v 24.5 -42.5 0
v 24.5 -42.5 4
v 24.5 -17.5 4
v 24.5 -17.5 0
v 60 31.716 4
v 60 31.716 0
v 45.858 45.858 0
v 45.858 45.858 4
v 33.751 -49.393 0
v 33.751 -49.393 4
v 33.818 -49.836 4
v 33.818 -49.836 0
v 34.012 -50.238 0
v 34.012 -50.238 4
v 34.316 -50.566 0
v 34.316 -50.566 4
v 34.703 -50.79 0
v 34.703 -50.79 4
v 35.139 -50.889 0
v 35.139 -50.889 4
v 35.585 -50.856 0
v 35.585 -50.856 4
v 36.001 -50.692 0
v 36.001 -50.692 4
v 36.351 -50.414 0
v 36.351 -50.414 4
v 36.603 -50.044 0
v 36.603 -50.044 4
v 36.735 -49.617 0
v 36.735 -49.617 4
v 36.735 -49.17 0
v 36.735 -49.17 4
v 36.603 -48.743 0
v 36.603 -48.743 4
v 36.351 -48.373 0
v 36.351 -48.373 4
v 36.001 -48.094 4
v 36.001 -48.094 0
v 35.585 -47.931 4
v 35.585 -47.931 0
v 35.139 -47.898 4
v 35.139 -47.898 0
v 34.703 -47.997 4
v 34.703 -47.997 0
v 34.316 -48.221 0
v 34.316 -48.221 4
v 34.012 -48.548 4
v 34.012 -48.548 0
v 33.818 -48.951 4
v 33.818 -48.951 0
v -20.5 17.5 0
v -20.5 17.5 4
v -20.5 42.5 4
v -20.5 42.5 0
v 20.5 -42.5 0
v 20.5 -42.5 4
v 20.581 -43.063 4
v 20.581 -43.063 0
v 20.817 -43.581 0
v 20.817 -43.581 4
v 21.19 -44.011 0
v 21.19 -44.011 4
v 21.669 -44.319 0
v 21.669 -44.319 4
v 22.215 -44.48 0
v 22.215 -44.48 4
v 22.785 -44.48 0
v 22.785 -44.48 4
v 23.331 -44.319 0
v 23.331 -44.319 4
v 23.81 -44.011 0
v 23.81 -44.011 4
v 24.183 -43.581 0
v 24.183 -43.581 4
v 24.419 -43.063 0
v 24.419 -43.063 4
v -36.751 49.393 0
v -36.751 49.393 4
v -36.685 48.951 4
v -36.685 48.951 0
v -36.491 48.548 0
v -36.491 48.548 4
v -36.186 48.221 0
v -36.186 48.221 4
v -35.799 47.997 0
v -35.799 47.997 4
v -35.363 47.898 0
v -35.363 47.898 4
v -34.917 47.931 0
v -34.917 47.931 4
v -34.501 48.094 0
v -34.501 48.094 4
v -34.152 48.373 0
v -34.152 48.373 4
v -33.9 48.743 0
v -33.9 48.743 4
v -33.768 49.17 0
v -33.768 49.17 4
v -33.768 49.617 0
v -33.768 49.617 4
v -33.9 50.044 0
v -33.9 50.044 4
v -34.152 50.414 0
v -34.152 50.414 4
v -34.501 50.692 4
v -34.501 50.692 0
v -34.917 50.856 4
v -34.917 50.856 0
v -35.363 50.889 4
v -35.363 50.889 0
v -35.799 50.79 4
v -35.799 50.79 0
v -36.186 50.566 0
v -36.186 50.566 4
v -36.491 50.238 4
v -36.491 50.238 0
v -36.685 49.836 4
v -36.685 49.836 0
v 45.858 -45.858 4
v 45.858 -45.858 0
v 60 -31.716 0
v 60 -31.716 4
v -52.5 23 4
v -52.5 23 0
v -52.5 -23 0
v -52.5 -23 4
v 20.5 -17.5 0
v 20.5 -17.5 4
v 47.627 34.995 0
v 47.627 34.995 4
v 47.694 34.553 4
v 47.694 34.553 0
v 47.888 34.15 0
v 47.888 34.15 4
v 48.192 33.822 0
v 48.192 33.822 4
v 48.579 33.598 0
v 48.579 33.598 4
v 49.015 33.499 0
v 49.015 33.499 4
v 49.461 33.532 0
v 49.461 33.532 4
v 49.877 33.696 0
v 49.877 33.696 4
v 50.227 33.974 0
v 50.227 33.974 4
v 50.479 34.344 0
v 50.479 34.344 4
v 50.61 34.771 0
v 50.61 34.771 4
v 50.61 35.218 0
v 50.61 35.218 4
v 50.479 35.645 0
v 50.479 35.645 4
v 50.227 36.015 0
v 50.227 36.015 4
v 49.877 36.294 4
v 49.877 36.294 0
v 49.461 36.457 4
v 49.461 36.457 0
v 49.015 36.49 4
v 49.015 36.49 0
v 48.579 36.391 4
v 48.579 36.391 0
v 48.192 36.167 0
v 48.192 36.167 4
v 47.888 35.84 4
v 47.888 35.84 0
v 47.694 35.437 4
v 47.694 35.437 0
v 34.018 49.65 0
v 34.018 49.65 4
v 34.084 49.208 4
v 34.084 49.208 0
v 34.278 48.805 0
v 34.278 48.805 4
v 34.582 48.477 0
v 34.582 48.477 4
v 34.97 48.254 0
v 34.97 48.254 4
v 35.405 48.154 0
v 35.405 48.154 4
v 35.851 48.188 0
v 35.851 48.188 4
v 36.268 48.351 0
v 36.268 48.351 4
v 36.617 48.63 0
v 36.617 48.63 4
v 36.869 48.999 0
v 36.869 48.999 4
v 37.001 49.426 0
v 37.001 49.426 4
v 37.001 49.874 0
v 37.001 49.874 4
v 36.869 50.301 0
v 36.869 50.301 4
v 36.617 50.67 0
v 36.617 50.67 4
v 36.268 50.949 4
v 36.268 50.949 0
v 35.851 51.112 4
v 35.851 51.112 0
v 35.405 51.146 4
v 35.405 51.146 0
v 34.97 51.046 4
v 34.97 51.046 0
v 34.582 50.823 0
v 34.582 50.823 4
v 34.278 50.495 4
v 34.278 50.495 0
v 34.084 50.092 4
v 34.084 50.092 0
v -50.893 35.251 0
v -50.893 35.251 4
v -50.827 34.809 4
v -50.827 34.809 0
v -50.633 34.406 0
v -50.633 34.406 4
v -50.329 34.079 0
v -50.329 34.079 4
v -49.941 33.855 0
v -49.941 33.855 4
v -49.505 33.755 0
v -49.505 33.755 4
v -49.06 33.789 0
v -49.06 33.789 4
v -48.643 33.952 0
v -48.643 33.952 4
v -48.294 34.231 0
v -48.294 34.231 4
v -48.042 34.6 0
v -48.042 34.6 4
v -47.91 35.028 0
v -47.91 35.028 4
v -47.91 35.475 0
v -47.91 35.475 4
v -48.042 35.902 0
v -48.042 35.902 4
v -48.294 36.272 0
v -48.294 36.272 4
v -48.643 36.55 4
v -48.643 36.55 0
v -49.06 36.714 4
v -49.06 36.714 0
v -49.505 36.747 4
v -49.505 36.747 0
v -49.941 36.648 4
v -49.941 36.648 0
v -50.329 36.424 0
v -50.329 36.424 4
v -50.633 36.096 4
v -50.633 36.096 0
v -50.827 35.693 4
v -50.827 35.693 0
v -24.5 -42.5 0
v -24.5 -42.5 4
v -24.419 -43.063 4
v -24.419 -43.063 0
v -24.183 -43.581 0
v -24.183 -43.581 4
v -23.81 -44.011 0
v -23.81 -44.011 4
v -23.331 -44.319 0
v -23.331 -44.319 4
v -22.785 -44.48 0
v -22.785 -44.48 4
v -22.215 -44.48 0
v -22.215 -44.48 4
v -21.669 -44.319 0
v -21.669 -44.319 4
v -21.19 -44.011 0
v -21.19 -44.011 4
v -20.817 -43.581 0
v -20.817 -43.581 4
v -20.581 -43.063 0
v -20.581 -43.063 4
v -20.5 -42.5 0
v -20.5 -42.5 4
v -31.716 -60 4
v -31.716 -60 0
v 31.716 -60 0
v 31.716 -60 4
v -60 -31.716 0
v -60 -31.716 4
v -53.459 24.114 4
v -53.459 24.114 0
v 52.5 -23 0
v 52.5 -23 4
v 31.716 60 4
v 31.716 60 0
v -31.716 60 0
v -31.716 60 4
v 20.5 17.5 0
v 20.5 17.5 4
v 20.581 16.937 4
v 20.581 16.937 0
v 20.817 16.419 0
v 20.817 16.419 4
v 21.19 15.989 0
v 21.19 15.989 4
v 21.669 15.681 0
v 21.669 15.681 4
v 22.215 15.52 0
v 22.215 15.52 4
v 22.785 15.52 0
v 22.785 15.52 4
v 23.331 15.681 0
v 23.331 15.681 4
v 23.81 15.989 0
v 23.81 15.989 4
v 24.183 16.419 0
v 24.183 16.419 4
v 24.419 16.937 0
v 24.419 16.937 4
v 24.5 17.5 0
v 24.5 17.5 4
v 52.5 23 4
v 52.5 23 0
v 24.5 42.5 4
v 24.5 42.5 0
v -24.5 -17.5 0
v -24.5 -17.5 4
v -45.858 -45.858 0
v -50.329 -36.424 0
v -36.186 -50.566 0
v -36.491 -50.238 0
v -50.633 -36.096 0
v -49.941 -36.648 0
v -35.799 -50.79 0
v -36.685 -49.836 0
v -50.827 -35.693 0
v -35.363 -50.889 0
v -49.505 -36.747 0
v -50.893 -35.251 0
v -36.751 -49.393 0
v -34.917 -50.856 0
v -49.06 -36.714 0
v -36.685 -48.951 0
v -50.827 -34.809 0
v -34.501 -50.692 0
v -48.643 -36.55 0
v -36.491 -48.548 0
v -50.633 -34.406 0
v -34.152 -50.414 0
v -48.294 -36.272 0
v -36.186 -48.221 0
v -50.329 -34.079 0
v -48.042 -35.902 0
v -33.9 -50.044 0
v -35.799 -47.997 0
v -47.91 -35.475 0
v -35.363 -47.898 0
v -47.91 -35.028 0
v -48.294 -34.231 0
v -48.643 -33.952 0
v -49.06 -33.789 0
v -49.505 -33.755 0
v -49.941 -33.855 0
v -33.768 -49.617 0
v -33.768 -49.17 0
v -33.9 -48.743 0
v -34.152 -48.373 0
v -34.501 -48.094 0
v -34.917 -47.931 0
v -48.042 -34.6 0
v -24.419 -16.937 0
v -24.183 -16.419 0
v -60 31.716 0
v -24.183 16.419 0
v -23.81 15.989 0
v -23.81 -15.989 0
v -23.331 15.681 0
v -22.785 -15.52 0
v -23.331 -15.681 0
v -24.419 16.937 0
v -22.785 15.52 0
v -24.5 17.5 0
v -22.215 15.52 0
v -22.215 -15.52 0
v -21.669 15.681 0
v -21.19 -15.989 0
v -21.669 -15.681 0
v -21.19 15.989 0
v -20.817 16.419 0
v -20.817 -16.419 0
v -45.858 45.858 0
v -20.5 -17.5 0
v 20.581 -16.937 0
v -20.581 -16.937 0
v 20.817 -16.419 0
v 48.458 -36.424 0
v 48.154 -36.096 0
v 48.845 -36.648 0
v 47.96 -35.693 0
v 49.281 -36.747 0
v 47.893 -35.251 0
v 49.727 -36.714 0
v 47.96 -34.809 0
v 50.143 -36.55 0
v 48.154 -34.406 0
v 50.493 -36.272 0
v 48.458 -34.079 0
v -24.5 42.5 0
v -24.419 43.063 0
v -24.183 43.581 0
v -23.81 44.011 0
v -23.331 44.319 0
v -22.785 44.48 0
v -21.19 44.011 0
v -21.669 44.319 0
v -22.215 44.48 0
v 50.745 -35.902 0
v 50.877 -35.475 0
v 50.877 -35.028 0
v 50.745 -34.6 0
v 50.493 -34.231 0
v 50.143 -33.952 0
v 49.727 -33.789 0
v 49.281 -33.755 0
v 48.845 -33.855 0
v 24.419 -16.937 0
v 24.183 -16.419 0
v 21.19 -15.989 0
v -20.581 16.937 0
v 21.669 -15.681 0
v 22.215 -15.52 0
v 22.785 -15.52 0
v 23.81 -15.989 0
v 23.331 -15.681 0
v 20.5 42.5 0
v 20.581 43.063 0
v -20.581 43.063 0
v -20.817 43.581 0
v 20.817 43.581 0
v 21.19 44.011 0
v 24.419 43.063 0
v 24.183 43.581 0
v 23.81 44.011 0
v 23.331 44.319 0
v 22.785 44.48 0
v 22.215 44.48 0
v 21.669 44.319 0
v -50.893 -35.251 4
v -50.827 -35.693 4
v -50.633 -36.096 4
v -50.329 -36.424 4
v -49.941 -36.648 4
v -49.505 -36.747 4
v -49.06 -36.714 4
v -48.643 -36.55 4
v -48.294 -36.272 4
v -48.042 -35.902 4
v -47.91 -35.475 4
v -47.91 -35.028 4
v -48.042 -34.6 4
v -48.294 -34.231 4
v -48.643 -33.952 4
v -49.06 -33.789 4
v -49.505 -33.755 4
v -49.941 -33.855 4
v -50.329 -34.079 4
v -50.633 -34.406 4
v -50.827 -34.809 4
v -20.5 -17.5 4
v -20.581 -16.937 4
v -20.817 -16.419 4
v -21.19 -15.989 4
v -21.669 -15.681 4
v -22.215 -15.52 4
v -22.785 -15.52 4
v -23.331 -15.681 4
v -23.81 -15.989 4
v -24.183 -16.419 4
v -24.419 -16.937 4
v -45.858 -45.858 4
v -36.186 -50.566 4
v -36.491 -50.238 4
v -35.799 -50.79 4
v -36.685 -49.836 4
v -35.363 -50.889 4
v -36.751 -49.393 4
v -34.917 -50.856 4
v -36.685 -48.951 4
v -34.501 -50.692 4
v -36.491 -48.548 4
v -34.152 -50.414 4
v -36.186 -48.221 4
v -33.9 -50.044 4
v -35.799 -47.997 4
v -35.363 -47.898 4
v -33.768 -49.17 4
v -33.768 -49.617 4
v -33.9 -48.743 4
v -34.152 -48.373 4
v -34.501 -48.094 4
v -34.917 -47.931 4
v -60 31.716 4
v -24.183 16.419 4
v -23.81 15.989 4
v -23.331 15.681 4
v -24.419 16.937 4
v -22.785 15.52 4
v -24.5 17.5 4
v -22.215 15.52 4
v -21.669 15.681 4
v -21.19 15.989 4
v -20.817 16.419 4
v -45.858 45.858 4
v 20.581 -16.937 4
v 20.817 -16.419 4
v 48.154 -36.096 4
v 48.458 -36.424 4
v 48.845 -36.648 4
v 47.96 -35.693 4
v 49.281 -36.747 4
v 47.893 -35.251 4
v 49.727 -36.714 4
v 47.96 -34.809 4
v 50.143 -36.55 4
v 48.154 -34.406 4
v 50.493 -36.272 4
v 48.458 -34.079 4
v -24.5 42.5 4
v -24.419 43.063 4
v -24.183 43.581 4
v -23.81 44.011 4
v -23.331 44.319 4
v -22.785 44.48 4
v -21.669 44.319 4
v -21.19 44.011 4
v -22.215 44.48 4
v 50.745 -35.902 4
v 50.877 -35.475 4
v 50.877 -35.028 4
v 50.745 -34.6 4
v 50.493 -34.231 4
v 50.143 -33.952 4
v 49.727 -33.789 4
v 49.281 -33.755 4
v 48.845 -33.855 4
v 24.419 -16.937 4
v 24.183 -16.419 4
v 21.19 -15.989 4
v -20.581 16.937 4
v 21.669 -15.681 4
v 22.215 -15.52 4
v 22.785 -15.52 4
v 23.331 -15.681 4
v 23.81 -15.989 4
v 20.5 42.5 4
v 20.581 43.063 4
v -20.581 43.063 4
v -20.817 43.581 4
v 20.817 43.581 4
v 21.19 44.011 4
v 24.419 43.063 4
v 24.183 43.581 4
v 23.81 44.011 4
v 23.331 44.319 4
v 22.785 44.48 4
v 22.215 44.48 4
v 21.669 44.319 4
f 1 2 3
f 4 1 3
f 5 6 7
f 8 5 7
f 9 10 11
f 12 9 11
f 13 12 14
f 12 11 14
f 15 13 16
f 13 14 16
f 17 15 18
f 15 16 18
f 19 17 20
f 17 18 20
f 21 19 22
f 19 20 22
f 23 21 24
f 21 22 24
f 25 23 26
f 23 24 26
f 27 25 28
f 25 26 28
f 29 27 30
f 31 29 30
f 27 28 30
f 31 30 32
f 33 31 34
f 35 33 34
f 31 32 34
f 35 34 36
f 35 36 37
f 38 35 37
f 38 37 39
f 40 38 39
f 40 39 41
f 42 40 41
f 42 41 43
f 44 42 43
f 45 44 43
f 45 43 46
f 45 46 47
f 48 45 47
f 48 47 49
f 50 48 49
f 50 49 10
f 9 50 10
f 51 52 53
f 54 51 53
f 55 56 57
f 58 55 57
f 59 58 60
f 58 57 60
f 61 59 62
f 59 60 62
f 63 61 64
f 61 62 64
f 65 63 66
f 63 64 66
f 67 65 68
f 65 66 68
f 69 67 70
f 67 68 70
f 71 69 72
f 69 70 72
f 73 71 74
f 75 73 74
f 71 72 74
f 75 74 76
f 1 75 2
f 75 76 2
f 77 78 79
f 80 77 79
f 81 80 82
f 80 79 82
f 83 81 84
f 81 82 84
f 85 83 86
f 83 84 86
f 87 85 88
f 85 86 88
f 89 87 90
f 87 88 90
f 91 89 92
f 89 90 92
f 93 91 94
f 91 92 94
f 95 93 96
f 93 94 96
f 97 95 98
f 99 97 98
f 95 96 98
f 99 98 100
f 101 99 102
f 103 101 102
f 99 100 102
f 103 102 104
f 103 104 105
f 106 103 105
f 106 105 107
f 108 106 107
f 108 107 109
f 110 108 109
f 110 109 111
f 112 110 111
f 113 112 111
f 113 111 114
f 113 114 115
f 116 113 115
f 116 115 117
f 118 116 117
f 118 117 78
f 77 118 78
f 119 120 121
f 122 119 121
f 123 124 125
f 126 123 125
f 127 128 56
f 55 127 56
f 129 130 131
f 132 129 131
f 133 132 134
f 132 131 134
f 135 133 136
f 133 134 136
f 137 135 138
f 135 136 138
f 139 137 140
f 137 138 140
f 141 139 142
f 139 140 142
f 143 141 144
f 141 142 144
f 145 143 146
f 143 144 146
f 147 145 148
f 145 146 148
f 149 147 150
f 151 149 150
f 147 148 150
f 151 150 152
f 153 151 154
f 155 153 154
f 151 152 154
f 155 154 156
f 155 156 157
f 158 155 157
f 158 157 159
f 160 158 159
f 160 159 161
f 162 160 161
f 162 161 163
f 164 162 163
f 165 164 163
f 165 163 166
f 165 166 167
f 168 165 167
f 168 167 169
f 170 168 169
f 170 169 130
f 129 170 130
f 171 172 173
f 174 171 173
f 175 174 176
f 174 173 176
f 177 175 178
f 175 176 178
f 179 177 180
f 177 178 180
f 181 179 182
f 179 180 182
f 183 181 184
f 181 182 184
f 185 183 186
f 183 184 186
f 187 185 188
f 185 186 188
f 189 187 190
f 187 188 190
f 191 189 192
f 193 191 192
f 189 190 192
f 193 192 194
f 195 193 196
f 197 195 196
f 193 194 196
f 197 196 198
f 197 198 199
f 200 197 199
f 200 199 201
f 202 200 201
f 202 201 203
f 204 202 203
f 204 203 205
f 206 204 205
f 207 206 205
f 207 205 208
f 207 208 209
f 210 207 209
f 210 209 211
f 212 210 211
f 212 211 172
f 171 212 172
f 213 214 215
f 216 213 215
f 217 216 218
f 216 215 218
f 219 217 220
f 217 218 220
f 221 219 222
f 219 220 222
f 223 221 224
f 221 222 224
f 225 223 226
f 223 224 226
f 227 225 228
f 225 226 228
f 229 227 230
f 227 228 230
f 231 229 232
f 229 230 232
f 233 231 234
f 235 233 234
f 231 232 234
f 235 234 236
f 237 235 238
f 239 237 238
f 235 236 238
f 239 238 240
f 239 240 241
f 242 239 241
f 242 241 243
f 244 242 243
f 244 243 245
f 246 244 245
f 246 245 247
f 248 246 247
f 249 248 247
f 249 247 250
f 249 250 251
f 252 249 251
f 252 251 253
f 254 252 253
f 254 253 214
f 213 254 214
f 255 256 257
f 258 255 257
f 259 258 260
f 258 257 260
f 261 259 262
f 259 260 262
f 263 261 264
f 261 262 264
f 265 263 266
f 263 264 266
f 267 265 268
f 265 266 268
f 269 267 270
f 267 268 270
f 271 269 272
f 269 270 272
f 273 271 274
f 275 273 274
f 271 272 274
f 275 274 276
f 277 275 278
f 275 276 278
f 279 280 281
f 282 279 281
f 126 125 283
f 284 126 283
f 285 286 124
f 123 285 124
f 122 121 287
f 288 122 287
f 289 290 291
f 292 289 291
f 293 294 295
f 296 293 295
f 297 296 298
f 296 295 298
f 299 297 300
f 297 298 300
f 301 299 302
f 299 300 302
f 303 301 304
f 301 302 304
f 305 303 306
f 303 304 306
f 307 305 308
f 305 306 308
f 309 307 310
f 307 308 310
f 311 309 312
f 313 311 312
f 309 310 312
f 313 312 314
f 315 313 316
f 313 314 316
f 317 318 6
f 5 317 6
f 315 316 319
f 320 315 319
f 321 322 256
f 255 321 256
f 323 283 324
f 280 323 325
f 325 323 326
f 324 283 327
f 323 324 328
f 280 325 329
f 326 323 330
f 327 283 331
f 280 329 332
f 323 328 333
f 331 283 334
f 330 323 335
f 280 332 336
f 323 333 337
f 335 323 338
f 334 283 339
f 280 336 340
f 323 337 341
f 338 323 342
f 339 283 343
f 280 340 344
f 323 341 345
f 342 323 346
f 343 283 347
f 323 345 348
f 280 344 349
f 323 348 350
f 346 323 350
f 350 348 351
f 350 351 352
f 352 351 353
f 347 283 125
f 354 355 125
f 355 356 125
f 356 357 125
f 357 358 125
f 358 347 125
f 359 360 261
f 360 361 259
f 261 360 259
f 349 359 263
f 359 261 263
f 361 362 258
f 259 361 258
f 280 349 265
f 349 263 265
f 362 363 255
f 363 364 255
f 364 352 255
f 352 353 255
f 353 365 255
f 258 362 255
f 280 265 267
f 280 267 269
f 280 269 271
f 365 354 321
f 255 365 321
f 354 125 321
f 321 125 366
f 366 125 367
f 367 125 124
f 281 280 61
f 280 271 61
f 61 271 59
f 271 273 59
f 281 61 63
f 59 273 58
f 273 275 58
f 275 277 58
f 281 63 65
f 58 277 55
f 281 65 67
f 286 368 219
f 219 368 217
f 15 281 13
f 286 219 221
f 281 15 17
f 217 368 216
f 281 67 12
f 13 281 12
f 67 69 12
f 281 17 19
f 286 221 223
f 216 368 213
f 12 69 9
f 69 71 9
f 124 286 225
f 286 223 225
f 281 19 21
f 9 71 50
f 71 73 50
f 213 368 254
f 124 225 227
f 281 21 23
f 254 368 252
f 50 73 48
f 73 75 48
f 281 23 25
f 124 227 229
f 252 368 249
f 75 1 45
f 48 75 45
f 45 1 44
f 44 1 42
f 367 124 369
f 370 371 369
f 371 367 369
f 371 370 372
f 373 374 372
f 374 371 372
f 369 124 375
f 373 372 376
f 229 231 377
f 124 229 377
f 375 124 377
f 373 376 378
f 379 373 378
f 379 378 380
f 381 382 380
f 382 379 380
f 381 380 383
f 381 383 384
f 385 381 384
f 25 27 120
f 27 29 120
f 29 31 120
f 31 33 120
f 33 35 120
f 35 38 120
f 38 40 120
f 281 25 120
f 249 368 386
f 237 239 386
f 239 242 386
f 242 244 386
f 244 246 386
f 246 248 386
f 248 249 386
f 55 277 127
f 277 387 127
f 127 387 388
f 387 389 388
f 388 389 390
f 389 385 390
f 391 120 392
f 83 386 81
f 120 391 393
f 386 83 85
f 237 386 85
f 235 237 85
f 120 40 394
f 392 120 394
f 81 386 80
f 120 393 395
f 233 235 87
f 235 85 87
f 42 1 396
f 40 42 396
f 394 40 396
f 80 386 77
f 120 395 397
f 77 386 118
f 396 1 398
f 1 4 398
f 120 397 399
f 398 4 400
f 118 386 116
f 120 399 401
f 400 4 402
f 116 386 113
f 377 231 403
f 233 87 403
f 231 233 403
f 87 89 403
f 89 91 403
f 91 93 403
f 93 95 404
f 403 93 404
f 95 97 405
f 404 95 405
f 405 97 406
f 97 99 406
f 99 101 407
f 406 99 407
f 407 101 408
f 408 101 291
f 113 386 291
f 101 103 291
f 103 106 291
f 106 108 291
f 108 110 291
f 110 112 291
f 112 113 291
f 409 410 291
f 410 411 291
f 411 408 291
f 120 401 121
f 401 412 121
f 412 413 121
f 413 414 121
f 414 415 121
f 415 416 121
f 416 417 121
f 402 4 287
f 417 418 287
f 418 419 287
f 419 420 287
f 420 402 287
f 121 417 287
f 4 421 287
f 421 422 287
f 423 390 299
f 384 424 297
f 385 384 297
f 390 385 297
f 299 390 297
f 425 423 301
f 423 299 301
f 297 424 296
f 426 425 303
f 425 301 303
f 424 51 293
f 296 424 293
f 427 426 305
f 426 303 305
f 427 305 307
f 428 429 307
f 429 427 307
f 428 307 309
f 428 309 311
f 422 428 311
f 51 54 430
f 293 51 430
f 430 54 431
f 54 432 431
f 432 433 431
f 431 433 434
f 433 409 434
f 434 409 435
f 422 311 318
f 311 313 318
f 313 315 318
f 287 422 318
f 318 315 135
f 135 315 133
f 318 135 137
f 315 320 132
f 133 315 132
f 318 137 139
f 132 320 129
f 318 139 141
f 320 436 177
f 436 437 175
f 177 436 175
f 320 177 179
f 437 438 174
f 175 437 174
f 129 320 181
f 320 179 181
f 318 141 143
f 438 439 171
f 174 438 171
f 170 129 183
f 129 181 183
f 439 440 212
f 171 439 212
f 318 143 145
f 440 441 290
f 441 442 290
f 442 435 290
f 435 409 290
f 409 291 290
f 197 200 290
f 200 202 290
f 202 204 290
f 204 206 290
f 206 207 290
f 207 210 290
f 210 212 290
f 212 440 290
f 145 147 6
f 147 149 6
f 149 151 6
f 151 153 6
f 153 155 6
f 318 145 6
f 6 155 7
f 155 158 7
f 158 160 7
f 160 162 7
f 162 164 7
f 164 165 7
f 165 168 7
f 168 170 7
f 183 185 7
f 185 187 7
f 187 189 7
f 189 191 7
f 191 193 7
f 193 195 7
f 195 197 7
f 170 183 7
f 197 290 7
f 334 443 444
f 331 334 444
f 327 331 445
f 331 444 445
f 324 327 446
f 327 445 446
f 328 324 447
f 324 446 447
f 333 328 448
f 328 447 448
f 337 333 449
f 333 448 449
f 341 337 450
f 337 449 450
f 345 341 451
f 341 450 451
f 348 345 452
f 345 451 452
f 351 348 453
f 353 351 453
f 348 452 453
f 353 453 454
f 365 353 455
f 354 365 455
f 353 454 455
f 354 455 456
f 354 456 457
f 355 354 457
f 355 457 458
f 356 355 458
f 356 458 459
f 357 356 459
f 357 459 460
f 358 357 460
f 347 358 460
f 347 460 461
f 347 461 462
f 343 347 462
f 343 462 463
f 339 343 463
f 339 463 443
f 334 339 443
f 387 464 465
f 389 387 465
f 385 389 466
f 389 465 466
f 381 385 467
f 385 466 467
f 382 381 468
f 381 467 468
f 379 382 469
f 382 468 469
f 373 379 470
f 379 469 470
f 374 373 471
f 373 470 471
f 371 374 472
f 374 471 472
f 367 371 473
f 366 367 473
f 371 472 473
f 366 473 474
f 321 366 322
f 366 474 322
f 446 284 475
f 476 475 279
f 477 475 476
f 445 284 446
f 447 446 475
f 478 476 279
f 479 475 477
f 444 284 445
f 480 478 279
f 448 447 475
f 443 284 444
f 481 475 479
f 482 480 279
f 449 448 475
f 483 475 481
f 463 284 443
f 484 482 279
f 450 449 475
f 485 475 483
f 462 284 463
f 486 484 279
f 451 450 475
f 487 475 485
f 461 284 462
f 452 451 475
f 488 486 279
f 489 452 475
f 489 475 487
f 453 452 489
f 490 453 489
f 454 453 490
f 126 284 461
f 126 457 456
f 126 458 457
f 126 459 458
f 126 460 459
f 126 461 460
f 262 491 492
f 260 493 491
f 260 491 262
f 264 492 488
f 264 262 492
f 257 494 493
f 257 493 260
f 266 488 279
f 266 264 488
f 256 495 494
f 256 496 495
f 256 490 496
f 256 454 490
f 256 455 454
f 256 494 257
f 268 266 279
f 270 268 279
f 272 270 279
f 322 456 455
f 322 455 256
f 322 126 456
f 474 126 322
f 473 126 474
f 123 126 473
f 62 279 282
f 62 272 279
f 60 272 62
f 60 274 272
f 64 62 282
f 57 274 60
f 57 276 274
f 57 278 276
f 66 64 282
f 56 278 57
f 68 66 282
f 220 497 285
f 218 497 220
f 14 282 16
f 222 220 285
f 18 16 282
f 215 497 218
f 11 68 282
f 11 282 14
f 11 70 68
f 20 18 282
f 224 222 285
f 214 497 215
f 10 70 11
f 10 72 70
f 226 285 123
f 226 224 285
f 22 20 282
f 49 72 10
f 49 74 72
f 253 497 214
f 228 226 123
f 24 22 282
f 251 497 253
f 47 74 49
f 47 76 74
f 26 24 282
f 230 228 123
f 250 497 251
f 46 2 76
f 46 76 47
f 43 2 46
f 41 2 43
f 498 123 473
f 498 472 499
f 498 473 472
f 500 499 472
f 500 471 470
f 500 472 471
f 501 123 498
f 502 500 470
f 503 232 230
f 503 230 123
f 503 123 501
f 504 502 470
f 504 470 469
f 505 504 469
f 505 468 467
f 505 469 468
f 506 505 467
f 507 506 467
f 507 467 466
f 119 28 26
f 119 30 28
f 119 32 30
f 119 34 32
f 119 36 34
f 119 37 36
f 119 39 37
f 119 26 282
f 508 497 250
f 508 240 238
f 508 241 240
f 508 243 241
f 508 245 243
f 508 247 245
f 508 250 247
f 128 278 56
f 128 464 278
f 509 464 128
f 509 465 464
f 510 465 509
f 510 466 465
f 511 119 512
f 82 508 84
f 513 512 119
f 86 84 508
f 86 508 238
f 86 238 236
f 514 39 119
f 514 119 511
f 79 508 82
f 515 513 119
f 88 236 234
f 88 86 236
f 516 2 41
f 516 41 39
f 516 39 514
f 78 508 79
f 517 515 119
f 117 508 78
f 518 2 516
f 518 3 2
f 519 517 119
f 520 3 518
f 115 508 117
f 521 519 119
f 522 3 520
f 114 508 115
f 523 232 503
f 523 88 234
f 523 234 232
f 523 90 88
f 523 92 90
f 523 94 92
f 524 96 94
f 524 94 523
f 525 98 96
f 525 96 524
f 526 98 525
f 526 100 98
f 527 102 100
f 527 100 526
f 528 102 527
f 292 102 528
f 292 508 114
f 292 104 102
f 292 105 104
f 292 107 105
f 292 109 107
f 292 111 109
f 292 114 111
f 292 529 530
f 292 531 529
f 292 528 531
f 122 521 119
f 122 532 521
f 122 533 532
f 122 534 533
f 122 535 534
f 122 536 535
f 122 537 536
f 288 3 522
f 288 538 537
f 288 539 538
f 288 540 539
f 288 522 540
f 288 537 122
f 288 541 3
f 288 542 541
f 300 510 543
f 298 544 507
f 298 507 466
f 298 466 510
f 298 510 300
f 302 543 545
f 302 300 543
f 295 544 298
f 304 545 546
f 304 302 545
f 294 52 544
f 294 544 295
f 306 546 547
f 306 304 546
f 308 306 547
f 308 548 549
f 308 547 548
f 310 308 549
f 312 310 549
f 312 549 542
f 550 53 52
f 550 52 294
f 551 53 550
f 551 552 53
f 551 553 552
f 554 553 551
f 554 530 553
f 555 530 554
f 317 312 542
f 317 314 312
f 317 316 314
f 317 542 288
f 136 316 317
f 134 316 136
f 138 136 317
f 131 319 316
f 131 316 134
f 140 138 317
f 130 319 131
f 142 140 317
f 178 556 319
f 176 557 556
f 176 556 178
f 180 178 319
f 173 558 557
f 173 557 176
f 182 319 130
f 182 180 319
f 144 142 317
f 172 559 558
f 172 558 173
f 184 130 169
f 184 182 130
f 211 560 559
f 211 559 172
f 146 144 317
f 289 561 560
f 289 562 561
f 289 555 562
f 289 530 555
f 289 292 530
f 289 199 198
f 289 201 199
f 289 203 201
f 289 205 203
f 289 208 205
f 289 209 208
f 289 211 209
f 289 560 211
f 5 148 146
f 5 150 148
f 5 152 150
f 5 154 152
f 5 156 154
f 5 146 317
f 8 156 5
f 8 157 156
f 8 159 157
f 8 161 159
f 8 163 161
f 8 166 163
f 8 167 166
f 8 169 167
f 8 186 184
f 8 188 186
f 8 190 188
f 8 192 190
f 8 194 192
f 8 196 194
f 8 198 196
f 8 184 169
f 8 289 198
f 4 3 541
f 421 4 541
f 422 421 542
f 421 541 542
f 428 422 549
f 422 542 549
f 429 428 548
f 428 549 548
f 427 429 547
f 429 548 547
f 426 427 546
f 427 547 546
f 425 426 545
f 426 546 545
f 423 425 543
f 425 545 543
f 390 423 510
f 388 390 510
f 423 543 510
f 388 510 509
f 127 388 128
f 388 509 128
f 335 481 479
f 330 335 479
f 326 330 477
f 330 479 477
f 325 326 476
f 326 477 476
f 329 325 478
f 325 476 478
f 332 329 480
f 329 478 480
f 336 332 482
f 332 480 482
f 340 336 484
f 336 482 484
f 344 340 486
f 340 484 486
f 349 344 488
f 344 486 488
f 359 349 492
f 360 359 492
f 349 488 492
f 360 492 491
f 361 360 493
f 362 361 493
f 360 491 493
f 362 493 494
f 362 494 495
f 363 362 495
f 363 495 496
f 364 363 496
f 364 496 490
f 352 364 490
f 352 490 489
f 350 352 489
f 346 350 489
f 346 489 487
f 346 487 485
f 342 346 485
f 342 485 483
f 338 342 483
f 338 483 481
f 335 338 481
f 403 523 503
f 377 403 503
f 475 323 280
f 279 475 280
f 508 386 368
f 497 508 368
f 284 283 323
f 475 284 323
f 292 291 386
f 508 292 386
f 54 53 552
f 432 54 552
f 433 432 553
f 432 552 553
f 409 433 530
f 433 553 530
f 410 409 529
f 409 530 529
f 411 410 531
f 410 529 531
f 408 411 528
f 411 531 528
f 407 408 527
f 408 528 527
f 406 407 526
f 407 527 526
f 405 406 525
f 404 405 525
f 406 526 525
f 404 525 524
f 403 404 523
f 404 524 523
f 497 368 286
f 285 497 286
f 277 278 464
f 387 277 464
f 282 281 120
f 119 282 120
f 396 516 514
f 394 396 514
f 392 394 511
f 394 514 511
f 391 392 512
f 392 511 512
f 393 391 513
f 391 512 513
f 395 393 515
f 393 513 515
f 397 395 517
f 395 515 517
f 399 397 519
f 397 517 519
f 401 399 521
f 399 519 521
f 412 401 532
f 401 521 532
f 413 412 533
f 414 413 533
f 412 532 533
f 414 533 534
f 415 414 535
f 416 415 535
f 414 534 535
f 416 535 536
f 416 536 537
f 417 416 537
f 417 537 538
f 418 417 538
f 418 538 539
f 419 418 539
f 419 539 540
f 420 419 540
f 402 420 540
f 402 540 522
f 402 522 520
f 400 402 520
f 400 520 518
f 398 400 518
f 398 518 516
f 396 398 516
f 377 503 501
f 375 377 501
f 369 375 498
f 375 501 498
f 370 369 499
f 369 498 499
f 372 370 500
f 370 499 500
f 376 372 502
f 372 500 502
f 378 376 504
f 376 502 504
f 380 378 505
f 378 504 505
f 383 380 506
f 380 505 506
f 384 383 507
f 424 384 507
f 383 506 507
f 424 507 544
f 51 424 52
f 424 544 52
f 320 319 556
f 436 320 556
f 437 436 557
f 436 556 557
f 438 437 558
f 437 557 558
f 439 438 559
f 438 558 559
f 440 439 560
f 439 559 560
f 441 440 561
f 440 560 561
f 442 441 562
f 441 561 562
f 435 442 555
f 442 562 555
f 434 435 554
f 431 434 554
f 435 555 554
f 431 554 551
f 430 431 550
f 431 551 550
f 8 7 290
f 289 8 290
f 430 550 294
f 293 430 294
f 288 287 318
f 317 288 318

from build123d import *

# Parameters (mm, degrees)
F5_DEPTH = 4
F7_D     = 3
F9_DEPTH = 4.001


with BuildPart() as f5:
    # F4 (on Top) → F5 (new body)
    with BuildSketch(Plane.XY):
        Polygon((31.7157287525, 60), (-31.7157287525, 60), (-45.8578643763, 45.8578643763), (-60, 31.7157287525), (-53.459262274, 24.1143308548), (-52.5, 22.9995125363), (-52.5, -22.9995125363), (-60, -31.7157287525), (-45.8578643763, -45.8578643763), (-31.7157287525, -60), (31.7157287525, -60), (45.8578643763, -45.8578643763), (60, -31.7157287525), (52.5, -22.9995125363), (52.5, 22.9995125363), (60, 31.7157287525), (45.8578643763, 45.8578643763), align=None)
    extrude(amount=F5_DEPTH)

    # F7 (through all)
    with Locations(Plane(origin=(0, 0, 0), x_dir=(1, 0, 0), z_dir=(0, 0, -1))):
        with Locations((-49.3933982822, -35.2512626585), (-35.2512626585, -49.3933982822), (35.5175525155, -49.6500174851), (49.1271084251, -34.9946434556), (49.3933982822, 35.2512626585), (35.2512626585, 49.3933982822), (-35.2512626585, 49.3933982822), (-49.3933982822, 35.2512626585)):
            Hole(F7_D / 2)

    # F8 (on face) + F0 (on Top) → F9 (cut, through all)
    with BuildSketch(Plane.XY.offset(4)):
        with BuildLine():
            ThreePointArc((-20.5, 42.5), (-22.5, 44.5), (-24.5, 42.5))
            Line((-24.5, 42.5), (-24.5, 17.5))
            ThreePointArc((-24.5, 17.5), (-22.5, 15.5), (-20.5, 17.5))
            Line((-20.5, 17.5), (-20.5, 42.5))
        make_face()
        with BuildLine():
            ThreePointArc((24.5, 42.5), (22.5, 44.5), (20.5, 42.5))
            Line((20.5, 42.5), (20.5, 17.5))
            ThreePointArc((20.5, 17.5), (22.5, 15.5), (24.5, 17.5))
            Line((24.5, 17.5), (24.5, 42.5))
        make_face()
        with BuildLine():
            ThreePointArc((20.5, -42.5), (22.5, -44.5), (24.5, -42.5))
            Line((24.5, -42.5), (24.5, -17.5))
            ThreePointArc((24.5, -17.5), (22.5, -15.5), (20.5, -17.5))
            Line((20.5, -17.5), (20.5, -42.5))
        make_face()
        with BuildLine():
            ThreePointArc((-20.5, -17.5), (-22.5, -15.5), (-24.5, -17.5))
            Line((-24.5, -17.5), (-24.5, -42.5))
            ThreePointArc((-24.5, -42.5), (-22.5, -44.5), (-20.5, -42.5))
            Line((-20.5, -42.5), (-20.5, -17.5))
        make_face()
    with BuildSketch(Plane.XY):
        with BuildLine():
            Line((-92.5269119346, 112.3259018078), (-120.6951909025, 148.176438676))
            ThreePointArc((-120.6951909025, 148.176438676), (-118.5238761033, 143.1793796454), (-117.7817459305, 137.7817459305))
            ThreePointArc((-117.7817459305, 137.7817459305), (-127.9810789866, 120.3476721824), (-148.176438676, 120.6951909025))
            Line((-148.176438676, 120.6951909025), (-112.3259018078, 92.5269119346))
            Line((-112.3259018078, 92.5269119346), (-60, 31.7157287525))
            Line((-60, 31.7157287525), (-31.7157287525, 60))
            Line((-31.7157287525, 60), (-92.5269119346, 112.3259018078))
        make_face()
    extrude(amount=-F9_DEPTH, mode=Mode.SUBTRACT)


solid = f5.part
